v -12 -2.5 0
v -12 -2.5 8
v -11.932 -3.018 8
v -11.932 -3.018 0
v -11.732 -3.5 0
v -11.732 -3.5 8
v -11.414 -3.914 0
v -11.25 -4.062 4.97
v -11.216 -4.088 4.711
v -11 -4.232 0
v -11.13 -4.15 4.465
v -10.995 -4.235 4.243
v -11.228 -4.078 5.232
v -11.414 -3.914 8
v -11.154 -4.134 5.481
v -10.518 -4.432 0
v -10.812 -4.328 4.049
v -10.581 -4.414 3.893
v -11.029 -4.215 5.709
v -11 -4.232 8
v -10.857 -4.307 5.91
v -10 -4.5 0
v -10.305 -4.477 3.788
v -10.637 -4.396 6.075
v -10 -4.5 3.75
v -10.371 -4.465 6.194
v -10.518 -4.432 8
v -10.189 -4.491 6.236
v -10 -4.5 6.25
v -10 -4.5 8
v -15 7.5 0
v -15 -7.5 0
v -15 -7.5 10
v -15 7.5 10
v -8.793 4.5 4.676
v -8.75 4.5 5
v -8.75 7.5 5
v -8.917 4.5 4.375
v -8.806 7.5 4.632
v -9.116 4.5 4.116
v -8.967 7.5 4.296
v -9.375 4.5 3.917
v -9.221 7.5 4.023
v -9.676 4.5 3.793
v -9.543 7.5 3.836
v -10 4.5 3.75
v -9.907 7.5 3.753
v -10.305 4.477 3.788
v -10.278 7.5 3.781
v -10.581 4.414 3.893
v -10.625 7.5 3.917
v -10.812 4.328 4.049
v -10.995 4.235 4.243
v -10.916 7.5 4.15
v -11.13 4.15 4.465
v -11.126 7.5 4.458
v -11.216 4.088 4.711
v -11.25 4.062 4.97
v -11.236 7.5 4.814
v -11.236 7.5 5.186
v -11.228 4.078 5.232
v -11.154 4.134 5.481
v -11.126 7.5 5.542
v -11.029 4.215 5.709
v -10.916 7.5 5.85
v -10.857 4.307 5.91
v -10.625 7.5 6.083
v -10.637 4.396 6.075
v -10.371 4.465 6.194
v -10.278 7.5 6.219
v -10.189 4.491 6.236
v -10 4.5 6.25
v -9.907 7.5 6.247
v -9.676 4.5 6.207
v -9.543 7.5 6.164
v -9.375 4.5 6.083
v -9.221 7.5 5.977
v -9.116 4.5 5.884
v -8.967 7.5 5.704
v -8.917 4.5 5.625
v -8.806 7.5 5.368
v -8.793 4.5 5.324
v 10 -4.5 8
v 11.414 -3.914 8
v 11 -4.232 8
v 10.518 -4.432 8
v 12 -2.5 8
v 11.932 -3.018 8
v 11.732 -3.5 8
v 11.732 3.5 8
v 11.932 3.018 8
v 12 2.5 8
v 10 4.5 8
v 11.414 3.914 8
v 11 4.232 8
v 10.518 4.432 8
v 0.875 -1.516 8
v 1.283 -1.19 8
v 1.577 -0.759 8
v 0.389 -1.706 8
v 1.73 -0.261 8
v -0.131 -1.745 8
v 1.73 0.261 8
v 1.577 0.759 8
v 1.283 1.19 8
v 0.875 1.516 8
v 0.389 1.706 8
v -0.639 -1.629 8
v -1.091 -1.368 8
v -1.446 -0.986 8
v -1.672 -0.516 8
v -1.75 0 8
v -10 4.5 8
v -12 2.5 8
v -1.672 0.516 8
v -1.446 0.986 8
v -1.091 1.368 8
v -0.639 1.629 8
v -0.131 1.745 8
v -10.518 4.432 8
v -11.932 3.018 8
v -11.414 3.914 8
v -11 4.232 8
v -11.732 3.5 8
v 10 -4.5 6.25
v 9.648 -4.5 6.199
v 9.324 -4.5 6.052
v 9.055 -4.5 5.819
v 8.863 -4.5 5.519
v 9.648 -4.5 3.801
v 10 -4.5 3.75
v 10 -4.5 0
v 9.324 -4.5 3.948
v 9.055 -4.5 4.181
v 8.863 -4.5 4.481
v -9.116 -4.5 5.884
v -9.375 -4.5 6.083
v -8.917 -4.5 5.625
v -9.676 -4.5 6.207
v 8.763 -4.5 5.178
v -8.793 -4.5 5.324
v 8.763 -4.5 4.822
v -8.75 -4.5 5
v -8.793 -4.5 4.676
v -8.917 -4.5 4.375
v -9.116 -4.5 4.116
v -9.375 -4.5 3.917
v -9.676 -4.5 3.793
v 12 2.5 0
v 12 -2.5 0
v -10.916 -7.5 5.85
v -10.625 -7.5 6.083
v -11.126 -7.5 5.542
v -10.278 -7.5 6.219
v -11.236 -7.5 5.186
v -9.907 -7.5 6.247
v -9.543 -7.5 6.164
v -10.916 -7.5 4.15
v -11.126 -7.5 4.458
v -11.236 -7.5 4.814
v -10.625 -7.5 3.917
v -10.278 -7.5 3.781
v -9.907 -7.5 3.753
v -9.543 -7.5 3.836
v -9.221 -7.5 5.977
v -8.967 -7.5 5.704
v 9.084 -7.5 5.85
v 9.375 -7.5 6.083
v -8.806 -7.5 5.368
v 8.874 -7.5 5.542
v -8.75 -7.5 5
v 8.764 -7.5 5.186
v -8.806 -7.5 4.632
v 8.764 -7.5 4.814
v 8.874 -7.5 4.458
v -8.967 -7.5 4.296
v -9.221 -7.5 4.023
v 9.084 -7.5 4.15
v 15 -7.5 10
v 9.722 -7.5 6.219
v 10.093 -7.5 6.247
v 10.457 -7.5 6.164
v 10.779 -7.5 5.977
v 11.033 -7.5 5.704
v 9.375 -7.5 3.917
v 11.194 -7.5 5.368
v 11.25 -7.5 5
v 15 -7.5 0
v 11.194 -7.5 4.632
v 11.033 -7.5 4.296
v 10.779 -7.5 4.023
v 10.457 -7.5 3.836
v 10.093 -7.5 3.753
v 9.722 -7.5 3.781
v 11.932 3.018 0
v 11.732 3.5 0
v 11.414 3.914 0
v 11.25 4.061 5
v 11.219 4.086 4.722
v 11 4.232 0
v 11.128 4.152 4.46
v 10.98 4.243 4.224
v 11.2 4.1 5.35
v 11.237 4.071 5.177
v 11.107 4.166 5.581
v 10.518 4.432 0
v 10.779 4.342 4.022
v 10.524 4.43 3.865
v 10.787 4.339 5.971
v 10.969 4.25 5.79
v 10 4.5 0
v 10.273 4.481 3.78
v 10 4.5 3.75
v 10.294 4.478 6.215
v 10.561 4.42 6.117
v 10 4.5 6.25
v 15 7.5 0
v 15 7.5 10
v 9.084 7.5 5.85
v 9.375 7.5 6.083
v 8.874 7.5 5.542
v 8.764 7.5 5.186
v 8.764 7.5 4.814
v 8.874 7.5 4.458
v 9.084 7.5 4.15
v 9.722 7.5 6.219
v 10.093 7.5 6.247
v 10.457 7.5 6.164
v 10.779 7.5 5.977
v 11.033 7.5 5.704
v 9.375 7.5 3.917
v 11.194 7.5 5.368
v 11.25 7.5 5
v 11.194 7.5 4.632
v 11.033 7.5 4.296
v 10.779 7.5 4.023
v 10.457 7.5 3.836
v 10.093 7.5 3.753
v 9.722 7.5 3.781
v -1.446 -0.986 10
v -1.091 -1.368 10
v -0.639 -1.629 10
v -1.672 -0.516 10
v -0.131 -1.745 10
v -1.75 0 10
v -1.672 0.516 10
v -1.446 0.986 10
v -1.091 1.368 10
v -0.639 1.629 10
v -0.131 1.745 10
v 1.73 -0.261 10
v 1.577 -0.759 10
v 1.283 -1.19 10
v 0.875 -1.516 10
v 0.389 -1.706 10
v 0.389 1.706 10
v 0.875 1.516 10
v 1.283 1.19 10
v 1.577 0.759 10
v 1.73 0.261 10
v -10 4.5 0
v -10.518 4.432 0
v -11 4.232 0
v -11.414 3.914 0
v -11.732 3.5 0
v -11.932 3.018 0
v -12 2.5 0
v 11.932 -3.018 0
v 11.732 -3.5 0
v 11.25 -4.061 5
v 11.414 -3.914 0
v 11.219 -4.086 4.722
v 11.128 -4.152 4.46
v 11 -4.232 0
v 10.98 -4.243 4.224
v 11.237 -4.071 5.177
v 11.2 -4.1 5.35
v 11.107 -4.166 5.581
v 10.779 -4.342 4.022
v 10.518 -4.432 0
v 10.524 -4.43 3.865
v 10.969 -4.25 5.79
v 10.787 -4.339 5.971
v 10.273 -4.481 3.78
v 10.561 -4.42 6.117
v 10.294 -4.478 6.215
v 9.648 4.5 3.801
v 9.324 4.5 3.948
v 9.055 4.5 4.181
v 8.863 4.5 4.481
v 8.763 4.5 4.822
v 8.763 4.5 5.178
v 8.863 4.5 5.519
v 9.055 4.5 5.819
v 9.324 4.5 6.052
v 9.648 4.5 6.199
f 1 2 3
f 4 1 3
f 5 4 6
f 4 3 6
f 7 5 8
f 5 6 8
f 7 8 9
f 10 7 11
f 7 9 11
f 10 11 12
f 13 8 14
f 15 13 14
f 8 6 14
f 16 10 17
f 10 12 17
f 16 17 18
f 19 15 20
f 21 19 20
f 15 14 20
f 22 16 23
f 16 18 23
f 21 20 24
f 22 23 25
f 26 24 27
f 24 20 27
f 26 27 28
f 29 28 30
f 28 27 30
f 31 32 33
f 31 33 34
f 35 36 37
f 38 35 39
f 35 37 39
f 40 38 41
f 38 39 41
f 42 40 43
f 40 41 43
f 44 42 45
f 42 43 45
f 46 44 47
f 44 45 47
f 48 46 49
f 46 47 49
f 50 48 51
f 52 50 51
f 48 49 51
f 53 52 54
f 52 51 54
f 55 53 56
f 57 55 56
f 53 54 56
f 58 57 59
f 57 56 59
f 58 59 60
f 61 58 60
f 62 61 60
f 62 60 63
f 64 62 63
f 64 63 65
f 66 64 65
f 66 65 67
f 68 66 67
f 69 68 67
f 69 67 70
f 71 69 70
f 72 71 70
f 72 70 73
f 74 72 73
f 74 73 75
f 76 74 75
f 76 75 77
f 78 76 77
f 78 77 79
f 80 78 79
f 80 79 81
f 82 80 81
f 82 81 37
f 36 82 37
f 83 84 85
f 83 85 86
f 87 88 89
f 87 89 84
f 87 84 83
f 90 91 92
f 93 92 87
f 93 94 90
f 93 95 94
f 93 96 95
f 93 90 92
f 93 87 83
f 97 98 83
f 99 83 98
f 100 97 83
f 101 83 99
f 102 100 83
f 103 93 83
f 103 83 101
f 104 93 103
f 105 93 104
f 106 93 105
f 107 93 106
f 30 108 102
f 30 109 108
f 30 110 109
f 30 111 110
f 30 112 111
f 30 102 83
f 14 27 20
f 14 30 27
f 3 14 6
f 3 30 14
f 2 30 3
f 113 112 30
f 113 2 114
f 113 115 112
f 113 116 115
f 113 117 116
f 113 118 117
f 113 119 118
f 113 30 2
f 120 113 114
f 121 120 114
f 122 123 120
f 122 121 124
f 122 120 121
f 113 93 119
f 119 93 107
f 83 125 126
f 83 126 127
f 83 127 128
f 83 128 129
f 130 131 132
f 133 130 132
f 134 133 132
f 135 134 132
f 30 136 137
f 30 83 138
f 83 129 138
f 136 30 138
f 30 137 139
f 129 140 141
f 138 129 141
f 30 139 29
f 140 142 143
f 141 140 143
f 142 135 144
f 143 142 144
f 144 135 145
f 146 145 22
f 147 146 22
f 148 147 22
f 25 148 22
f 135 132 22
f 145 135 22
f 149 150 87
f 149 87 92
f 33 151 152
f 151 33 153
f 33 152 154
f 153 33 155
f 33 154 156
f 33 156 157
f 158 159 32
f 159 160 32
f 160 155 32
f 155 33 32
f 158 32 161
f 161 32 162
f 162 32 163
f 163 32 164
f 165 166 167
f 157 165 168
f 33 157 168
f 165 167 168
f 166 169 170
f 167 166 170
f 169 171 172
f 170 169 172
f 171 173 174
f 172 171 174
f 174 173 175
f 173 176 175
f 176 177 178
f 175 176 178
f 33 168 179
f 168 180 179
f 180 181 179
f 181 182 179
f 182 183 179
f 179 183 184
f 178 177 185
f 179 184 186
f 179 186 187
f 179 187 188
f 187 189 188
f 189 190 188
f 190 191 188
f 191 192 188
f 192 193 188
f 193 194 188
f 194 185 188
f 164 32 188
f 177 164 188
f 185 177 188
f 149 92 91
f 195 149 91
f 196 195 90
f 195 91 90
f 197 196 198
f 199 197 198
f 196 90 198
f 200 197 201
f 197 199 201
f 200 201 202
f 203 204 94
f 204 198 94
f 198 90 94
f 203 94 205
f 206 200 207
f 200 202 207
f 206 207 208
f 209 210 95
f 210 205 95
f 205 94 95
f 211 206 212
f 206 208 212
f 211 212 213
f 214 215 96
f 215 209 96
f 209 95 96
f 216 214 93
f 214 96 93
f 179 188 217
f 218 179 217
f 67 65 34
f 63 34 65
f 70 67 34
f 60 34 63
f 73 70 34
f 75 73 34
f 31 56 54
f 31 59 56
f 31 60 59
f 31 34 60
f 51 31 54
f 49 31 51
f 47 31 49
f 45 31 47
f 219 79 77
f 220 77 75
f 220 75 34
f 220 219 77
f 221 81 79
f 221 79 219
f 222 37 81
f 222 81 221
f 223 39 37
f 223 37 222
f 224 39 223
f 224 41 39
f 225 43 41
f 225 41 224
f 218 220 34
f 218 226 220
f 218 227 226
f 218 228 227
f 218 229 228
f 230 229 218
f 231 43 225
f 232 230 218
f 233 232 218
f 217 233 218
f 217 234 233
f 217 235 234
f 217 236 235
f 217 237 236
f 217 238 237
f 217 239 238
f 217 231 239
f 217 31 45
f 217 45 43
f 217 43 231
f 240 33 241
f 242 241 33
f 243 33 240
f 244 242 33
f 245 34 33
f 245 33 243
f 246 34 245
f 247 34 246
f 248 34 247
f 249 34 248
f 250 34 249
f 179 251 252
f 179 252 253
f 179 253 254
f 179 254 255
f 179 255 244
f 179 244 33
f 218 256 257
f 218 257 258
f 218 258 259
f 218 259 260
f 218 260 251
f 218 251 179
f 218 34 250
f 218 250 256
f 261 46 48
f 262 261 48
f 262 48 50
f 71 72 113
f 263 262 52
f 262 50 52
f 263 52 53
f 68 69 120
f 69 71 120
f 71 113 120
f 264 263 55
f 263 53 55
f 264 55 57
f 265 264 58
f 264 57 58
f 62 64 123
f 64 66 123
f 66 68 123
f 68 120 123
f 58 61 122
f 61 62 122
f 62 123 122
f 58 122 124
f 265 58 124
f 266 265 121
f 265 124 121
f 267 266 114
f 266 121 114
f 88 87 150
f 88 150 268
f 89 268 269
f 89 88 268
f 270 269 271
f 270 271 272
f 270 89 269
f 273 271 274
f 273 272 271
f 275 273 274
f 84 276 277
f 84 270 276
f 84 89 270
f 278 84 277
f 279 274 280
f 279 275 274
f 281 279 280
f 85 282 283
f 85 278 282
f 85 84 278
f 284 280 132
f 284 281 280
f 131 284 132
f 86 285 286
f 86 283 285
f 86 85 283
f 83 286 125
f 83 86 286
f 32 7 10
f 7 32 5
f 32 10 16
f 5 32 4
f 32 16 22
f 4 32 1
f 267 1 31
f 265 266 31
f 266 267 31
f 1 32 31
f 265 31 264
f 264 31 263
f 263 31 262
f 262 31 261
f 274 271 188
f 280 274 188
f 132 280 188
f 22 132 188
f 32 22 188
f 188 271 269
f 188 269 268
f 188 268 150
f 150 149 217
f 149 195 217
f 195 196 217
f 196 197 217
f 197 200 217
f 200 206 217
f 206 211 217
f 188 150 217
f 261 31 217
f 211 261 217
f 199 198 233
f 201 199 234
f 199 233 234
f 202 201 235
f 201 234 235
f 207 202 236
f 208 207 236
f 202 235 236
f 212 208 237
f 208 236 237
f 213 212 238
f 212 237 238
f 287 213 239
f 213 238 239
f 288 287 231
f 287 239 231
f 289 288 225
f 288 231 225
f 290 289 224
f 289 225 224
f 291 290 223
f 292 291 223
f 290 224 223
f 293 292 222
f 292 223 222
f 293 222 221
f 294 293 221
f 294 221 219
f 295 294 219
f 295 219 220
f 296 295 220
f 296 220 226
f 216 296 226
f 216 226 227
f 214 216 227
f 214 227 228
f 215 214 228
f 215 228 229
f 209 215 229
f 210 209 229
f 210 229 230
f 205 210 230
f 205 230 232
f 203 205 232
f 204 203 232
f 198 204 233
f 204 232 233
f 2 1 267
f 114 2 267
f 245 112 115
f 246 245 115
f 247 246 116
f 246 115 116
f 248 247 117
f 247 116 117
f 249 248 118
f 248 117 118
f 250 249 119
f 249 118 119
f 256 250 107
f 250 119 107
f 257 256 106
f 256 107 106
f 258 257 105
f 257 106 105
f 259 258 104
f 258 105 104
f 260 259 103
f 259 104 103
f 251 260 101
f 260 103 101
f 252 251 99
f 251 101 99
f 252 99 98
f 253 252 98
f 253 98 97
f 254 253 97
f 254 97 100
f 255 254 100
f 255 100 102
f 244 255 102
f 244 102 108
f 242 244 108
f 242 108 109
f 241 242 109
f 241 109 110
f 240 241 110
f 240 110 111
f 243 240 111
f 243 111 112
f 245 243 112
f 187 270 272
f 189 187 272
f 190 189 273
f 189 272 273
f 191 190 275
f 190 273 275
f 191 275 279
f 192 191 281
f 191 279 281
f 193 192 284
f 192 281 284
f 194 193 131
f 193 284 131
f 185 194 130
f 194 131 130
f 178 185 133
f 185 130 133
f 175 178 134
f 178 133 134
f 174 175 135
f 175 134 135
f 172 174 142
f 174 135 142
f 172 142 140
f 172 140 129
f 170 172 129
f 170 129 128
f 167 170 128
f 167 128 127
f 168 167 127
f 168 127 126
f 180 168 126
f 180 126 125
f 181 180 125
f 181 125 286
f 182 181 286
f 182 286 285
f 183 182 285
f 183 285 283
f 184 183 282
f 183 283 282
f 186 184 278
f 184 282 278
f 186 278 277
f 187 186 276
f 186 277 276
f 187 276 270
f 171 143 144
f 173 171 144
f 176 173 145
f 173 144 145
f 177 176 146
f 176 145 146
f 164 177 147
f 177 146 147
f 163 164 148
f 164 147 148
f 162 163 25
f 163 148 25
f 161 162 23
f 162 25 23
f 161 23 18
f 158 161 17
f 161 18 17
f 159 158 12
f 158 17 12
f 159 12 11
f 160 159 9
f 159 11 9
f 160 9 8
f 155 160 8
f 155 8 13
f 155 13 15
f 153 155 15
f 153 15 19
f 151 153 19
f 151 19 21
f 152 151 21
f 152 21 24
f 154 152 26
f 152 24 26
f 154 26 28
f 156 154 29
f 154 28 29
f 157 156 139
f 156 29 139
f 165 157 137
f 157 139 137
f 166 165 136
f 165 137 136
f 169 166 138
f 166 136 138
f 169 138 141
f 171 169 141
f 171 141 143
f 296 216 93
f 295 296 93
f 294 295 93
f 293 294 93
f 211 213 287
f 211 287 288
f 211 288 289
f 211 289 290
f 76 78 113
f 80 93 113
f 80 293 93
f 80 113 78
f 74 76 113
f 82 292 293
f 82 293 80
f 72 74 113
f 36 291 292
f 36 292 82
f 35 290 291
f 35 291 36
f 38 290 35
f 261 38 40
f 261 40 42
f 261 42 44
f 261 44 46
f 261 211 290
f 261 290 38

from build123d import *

# Parameters (mm, degrees)
ESQUISSE1_W             = 30
ESQUISSE1_H             = 15
BOSS_EXTRU_1_DEPTH      = 10
ESQUISSE2_W             = 24
ESQUISSE2_H             = 9
ENL_V_MAT_EXTRU_1_DEPTH = 8
CONG_1_R                = 2
ESQUISSE3_R             = 1.75
ENL_V_MAT_EXTRU_2_DEPTH = 3
TROU_TARAUD_M31_D       = 2.5
TROU_TARAUD_M32_D       = 2.5


with BuildPart() as part:
    # Esquisse1 → Boss.-Extru.1 (new body)
    with BuildSketch(Plane.XY):
        Rectangle(ESQUISSE1_W, ESQUISSE1_H)
    extrude(amount=BOSS_EXTRU_1_DEPTH)

    # Esquisse2 → Enlèv. mat.-Extru.1 (cut)
    with BuildSketch(Plane(origin=(0, 0, 0), x_dir=(-1, 0, 0), z_dir=(0, 0, -1))):
        Rectangle(ESQUISSE2_W, ESQUISSE2_H)
    extrude(amount=-ENL_V_MAT_EXTRU_1_DEPTH, mode=Mode.SUBTRACT)

    # Congé1
    cong_1_edges = [part.edges().sort_by_distance(p)[0] for p in [
        (12, -4.5, 4),
        (12, 4.5, 4),
        (-12, 4.5, 4),
        (-12, -4.5, 4),
    ]]
    fillet(cong_1_edges, radius=CONG_1_R)

    # Esquisse3 → Enlèv. mat.-Extru.2 (cut, through all)
    with BuildSketch(Plane(origin=(0, 0, 8), x_dir=(-1, 0, 0), z_dir=(0, 0, -1))):
        Circle(ESQUISSE3_R)
    extrude(amount=-ENL_V_MAT_EXTRU_2_DEPTH, mode=Mode.SUBTRACT)

    # Trou taraudé M31 (through all)
    with Locations(Plane(origin=(0, -7.5, 0), x_dir=(-1, 0, 0), z_dir=(0, -1, 0))):
        with Locations((-10, -5)):
            Hole(TROU_TARAUD_M31_D / 2)

    # Trou taraudé M32 (through all)
    with Locations(Plane(origin=(0, -7.5, 0), x_dir=(-1, 0, 0), z_dir=(0, -1, 0))):
        with Locations((10, -5)):
            Hole(TROU_TARAUD_M32_D / 2)


solid = part.part
